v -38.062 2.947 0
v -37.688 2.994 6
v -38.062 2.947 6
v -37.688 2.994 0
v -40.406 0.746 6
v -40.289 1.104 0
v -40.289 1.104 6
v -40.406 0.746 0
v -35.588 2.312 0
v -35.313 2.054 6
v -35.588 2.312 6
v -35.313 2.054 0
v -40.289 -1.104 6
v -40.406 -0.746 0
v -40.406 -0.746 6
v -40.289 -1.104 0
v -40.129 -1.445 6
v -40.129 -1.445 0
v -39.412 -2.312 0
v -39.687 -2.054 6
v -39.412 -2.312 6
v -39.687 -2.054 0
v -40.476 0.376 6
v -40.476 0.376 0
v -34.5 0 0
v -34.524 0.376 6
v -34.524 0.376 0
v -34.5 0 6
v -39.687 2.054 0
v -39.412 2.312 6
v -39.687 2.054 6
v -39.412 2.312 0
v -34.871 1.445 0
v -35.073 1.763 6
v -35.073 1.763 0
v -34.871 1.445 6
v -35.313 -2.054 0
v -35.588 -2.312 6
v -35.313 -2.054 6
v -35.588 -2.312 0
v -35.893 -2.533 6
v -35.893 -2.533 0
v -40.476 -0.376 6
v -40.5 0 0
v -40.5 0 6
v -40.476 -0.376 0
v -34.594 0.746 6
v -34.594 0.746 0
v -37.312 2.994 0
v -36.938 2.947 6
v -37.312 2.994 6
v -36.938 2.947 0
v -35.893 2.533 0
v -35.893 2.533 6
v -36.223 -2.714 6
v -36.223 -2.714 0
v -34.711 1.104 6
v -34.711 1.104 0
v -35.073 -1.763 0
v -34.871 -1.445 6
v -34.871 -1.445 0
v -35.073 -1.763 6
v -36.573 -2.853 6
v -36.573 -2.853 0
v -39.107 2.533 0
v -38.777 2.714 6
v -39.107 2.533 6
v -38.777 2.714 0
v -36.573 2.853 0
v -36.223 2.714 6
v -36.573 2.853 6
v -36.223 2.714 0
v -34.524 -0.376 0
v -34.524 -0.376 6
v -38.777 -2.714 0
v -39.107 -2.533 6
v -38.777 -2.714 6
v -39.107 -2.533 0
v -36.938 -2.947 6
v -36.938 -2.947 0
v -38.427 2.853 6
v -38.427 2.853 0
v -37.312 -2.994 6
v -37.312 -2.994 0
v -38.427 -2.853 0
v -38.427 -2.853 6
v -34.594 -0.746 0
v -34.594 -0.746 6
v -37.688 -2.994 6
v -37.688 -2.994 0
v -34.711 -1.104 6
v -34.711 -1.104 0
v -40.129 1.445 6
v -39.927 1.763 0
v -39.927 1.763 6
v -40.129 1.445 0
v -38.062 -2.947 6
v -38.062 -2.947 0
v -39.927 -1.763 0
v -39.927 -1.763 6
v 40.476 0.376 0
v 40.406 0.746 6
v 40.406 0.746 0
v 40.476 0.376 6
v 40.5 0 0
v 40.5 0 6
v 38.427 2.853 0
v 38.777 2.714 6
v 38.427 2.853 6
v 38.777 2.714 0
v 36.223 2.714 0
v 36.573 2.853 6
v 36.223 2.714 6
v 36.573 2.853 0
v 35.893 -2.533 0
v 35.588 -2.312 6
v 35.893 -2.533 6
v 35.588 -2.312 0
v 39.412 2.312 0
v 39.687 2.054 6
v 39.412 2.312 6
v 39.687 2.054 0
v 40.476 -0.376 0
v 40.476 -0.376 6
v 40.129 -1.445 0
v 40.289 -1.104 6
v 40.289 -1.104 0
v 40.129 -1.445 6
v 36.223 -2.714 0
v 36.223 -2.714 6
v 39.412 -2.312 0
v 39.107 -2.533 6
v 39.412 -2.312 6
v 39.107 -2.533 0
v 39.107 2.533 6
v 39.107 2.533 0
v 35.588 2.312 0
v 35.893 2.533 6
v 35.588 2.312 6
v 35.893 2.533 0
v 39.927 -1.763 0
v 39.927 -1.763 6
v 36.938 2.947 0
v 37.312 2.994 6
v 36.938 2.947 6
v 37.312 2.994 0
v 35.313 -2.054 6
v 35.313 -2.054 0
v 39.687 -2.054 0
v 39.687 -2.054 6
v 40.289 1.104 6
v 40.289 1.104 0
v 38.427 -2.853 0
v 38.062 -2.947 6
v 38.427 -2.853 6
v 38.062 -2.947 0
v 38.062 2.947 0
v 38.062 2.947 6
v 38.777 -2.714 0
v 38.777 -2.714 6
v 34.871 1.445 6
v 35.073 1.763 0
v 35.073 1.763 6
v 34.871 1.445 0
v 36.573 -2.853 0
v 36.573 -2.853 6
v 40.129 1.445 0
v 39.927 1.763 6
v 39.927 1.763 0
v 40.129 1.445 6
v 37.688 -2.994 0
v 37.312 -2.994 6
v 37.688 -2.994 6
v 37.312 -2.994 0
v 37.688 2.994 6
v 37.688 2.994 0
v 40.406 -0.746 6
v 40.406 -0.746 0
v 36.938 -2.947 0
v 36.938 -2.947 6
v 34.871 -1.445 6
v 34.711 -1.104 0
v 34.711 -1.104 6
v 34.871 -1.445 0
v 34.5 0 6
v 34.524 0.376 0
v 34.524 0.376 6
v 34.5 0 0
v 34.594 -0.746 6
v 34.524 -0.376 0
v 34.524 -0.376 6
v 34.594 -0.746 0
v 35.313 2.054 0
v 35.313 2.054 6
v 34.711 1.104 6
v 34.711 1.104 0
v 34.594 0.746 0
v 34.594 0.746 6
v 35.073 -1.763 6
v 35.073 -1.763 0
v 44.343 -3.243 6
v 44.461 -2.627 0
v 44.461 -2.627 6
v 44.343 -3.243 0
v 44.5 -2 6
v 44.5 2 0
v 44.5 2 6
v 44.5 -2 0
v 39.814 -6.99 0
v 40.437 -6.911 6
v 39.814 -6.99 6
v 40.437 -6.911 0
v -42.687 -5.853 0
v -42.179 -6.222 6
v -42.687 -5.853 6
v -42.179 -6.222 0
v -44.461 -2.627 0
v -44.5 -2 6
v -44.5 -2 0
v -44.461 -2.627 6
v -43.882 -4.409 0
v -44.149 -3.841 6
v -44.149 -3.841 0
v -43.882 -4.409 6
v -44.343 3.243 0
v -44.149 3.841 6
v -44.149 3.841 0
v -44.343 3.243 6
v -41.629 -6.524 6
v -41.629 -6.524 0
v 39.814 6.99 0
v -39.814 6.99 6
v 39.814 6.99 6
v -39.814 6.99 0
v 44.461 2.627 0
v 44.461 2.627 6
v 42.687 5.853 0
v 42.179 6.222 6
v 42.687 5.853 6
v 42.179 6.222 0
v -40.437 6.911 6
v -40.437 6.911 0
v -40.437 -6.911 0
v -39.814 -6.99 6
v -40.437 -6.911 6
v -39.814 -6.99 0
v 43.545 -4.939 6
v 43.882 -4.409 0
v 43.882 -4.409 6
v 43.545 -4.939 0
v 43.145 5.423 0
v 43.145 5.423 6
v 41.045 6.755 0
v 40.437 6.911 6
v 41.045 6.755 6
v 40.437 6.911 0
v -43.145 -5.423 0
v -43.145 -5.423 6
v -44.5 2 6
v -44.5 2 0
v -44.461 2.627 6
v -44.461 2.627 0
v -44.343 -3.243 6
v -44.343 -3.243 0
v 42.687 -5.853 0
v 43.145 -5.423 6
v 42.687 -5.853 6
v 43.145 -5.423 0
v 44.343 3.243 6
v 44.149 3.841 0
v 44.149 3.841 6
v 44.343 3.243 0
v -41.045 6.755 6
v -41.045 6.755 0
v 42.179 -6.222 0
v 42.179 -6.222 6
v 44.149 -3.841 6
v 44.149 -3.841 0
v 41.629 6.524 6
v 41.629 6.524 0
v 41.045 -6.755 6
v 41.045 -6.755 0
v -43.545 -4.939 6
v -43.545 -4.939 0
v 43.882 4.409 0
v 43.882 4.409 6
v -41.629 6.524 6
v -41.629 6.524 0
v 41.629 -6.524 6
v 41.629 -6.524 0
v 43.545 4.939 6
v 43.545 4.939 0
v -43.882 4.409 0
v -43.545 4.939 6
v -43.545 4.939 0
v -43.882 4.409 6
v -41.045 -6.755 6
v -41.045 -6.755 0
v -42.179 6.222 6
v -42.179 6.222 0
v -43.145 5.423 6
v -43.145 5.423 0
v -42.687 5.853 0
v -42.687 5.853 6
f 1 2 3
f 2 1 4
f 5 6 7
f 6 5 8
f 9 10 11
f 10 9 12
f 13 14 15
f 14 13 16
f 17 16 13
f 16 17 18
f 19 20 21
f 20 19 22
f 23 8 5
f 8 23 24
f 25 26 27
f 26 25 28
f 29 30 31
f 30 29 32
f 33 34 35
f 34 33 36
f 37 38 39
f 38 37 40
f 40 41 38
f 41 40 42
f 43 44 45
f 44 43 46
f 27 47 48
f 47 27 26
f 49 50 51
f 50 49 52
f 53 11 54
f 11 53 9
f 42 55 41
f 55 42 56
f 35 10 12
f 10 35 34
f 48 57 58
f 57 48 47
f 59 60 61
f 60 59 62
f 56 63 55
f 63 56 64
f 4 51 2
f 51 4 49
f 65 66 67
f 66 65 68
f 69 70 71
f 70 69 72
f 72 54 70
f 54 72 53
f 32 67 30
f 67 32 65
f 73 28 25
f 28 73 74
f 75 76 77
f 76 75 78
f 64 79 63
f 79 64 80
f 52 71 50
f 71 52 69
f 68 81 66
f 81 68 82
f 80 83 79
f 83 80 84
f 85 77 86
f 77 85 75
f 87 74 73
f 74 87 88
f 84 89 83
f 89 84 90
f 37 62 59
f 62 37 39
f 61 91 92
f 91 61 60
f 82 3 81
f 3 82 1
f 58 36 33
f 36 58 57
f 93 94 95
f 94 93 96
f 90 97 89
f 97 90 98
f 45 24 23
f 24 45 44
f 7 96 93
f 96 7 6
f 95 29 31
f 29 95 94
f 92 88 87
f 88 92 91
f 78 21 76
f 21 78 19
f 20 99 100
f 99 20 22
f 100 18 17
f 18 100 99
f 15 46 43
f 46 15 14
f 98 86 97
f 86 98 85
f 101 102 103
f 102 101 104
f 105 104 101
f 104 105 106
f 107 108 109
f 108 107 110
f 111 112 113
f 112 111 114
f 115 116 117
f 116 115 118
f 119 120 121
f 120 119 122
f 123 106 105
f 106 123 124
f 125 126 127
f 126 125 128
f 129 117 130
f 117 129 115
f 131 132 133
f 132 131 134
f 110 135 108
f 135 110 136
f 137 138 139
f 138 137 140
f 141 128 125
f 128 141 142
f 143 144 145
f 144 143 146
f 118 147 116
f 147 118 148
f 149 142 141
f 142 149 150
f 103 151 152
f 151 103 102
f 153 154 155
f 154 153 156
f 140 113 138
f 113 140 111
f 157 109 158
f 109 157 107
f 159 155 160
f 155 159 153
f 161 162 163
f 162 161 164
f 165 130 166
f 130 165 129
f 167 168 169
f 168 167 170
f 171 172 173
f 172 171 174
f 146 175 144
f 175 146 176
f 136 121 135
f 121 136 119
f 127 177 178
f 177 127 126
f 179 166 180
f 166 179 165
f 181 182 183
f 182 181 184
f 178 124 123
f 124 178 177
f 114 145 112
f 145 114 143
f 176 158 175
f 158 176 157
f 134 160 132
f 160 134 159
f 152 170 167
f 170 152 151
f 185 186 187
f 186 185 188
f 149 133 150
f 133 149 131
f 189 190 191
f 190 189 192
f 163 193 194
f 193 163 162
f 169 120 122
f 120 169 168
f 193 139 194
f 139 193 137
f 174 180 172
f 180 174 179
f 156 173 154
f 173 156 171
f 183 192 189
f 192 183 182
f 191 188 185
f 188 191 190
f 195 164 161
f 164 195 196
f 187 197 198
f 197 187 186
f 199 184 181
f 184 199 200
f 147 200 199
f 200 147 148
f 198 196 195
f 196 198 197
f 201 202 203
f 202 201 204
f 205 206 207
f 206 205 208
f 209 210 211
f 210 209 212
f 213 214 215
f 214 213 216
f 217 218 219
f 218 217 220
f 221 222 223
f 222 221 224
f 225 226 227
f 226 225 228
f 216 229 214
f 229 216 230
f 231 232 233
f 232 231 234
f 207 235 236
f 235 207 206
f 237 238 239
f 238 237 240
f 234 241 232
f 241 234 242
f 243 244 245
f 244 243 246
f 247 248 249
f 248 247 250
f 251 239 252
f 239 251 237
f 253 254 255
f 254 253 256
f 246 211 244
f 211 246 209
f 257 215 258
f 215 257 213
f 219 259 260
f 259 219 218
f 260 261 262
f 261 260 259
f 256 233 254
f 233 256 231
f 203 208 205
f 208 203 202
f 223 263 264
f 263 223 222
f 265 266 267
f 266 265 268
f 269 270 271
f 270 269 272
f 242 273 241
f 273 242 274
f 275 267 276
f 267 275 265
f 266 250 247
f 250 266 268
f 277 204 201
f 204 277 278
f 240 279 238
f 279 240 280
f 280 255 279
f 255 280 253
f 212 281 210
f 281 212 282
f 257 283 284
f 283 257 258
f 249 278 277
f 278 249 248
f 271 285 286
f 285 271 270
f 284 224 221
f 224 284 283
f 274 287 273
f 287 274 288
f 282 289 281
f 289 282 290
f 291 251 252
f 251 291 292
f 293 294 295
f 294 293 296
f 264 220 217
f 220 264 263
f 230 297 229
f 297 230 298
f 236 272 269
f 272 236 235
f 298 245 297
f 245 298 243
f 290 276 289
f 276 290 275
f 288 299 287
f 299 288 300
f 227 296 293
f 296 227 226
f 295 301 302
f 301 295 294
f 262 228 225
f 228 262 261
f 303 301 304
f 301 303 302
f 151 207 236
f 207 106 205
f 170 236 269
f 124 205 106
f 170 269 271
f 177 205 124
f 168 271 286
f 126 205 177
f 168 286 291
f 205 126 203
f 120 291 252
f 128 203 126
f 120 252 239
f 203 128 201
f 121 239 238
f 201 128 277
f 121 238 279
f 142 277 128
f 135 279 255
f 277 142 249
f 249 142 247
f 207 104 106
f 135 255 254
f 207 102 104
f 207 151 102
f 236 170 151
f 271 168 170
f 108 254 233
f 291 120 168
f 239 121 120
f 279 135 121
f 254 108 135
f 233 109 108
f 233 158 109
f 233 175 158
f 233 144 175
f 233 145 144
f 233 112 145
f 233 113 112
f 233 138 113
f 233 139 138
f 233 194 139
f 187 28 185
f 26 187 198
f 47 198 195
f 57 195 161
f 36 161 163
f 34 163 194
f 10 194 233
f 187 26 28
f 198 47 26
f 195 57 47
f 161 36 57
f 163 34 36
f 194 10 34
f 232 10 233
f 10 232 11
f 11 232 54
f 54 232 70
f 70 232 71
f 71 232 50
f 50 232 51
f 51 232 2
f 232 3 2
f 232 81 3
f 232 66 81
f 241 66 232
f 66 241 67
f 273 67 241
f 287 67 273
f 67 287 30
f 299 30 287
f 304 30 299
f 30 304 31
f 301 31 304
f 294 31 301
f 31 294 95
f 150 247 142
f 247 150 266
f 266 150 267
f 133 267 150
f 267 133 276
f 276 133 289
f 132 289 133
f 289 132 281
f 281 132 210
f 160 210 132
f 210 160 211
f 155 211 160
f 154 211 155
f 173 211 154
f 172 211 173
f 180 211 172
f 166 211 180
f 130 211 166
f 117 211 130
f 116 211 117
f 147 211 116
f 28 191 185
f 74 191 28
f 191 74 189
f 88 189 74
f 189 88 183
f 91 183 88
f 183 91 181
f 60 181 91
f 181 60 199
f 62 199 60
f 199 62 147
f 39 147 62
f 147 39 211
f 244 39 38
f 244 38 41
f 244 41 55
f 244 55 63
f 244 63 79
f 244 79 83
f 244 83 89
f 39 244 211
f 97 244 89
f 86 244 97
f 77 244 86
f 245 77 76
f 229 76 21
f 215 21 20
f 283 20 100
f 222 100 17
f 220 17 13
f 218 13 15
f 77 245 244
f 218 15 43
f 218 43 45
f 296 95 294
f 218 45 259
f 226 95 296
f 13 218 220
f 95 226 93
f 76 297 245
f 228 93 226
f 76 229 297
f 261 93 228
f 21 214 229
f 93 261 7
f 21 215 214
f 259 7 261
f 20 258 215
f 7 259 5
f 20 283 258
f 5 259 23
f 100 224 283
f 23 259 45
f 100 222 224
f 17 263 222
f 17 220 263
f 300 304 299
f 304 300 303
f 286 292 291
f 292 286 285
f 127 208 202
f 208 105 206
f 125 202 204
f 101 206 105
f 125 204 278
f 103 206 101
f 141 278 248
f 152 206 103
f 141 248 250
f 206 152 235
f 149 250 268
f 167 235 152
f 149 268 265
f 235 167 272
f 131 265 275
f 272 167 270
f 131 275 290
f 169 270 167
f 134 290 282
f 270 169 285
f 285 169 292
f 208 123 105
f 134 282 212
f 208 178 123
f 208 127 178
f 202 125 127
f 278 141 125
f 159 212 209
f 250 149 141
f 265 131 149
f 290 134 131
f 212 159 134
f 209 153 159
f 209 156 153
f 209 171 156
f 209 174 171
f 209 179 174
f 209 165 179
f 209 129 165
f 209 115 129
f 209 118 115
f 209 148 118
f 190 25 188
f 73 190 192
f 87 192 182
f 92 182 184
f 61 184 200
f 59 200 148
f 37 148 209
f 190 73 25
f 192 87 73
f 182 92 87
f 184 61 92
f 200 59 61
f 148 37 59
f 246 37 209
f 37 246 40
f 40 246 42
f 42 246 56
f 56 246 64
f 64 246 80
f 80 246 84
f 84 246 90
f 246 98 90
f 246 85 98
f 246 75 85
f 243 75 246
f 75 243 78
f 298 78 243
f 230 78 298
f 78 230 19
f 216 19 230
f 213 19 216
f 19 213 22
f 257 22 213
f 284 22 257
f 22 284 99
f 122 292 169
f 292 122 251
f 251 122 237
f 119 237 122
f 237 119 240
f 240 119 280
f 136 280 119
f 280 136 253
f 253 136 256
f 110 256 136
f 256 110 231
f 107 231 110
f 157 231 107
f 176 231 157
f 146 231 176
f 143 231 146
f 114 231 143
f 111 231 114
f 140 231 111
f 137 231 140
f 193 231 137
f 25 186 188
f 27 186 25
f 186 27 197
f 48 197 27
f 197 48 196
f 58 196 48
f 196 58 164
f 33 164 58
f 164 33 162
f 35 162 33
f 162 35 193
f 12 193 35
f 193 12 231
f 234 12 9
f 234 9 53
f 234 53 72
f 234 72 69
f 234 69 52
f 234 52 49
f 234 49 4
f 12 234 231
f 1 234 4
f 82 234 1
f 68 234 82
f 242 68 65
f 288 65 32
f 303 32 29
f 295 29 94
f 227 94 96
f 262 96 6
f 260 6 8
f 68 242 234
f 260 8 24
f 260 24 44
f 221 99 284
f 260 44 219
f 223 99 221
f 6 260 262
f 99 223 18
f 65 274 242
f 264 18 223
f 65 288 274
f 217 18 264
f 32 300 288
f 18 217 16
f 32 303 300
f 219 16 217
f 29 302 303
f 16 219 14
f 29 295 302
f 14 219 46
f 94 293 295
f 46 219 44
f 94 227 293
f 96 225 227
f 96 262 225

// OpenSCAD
$fn = 50;


difference() {
	union() {
		hull() {
			translate(v = [-39.5000000000, 2.0000000000, 0]) {
				cylinder(h = 6, r = 5);
			}
			translate(v = [39.5000000000, 2.0000000000, 0]) {
				cylinder(h = 6, r = 5);
			}
			translate(v = [-39.5000000000, -2.0000000000, 0]) {
				cylinder(h = 6, r = 5);
			}
			translate(v = [39.5000000000, -2.0000000000, 0]) {
				cylinder(h = 6, r = 5);
			}
		}
	}
	union() {
		translate(v = [-37.5000000000, 0.0000000000, -100.0000000000]) {
			cylinder(h = 200, r = 3.0000000000);
		}
		translate(v = [-37.5000000000, 0.0000000000, -100.0000000000]) {
			cylinder(h = 200, r = 3.0000000000);
		}
		translate(v = [37.5000000000, 0.0000000000, -100.0000000000]) {
			cylinder(h = 200, r = 3.0000000000);
		}
		translate(v = [37.5000000000, 0.0000000000, -100.0000000000]) {
			cylinder(h = 200, r = 3.0000000000);
		}
	}
}
